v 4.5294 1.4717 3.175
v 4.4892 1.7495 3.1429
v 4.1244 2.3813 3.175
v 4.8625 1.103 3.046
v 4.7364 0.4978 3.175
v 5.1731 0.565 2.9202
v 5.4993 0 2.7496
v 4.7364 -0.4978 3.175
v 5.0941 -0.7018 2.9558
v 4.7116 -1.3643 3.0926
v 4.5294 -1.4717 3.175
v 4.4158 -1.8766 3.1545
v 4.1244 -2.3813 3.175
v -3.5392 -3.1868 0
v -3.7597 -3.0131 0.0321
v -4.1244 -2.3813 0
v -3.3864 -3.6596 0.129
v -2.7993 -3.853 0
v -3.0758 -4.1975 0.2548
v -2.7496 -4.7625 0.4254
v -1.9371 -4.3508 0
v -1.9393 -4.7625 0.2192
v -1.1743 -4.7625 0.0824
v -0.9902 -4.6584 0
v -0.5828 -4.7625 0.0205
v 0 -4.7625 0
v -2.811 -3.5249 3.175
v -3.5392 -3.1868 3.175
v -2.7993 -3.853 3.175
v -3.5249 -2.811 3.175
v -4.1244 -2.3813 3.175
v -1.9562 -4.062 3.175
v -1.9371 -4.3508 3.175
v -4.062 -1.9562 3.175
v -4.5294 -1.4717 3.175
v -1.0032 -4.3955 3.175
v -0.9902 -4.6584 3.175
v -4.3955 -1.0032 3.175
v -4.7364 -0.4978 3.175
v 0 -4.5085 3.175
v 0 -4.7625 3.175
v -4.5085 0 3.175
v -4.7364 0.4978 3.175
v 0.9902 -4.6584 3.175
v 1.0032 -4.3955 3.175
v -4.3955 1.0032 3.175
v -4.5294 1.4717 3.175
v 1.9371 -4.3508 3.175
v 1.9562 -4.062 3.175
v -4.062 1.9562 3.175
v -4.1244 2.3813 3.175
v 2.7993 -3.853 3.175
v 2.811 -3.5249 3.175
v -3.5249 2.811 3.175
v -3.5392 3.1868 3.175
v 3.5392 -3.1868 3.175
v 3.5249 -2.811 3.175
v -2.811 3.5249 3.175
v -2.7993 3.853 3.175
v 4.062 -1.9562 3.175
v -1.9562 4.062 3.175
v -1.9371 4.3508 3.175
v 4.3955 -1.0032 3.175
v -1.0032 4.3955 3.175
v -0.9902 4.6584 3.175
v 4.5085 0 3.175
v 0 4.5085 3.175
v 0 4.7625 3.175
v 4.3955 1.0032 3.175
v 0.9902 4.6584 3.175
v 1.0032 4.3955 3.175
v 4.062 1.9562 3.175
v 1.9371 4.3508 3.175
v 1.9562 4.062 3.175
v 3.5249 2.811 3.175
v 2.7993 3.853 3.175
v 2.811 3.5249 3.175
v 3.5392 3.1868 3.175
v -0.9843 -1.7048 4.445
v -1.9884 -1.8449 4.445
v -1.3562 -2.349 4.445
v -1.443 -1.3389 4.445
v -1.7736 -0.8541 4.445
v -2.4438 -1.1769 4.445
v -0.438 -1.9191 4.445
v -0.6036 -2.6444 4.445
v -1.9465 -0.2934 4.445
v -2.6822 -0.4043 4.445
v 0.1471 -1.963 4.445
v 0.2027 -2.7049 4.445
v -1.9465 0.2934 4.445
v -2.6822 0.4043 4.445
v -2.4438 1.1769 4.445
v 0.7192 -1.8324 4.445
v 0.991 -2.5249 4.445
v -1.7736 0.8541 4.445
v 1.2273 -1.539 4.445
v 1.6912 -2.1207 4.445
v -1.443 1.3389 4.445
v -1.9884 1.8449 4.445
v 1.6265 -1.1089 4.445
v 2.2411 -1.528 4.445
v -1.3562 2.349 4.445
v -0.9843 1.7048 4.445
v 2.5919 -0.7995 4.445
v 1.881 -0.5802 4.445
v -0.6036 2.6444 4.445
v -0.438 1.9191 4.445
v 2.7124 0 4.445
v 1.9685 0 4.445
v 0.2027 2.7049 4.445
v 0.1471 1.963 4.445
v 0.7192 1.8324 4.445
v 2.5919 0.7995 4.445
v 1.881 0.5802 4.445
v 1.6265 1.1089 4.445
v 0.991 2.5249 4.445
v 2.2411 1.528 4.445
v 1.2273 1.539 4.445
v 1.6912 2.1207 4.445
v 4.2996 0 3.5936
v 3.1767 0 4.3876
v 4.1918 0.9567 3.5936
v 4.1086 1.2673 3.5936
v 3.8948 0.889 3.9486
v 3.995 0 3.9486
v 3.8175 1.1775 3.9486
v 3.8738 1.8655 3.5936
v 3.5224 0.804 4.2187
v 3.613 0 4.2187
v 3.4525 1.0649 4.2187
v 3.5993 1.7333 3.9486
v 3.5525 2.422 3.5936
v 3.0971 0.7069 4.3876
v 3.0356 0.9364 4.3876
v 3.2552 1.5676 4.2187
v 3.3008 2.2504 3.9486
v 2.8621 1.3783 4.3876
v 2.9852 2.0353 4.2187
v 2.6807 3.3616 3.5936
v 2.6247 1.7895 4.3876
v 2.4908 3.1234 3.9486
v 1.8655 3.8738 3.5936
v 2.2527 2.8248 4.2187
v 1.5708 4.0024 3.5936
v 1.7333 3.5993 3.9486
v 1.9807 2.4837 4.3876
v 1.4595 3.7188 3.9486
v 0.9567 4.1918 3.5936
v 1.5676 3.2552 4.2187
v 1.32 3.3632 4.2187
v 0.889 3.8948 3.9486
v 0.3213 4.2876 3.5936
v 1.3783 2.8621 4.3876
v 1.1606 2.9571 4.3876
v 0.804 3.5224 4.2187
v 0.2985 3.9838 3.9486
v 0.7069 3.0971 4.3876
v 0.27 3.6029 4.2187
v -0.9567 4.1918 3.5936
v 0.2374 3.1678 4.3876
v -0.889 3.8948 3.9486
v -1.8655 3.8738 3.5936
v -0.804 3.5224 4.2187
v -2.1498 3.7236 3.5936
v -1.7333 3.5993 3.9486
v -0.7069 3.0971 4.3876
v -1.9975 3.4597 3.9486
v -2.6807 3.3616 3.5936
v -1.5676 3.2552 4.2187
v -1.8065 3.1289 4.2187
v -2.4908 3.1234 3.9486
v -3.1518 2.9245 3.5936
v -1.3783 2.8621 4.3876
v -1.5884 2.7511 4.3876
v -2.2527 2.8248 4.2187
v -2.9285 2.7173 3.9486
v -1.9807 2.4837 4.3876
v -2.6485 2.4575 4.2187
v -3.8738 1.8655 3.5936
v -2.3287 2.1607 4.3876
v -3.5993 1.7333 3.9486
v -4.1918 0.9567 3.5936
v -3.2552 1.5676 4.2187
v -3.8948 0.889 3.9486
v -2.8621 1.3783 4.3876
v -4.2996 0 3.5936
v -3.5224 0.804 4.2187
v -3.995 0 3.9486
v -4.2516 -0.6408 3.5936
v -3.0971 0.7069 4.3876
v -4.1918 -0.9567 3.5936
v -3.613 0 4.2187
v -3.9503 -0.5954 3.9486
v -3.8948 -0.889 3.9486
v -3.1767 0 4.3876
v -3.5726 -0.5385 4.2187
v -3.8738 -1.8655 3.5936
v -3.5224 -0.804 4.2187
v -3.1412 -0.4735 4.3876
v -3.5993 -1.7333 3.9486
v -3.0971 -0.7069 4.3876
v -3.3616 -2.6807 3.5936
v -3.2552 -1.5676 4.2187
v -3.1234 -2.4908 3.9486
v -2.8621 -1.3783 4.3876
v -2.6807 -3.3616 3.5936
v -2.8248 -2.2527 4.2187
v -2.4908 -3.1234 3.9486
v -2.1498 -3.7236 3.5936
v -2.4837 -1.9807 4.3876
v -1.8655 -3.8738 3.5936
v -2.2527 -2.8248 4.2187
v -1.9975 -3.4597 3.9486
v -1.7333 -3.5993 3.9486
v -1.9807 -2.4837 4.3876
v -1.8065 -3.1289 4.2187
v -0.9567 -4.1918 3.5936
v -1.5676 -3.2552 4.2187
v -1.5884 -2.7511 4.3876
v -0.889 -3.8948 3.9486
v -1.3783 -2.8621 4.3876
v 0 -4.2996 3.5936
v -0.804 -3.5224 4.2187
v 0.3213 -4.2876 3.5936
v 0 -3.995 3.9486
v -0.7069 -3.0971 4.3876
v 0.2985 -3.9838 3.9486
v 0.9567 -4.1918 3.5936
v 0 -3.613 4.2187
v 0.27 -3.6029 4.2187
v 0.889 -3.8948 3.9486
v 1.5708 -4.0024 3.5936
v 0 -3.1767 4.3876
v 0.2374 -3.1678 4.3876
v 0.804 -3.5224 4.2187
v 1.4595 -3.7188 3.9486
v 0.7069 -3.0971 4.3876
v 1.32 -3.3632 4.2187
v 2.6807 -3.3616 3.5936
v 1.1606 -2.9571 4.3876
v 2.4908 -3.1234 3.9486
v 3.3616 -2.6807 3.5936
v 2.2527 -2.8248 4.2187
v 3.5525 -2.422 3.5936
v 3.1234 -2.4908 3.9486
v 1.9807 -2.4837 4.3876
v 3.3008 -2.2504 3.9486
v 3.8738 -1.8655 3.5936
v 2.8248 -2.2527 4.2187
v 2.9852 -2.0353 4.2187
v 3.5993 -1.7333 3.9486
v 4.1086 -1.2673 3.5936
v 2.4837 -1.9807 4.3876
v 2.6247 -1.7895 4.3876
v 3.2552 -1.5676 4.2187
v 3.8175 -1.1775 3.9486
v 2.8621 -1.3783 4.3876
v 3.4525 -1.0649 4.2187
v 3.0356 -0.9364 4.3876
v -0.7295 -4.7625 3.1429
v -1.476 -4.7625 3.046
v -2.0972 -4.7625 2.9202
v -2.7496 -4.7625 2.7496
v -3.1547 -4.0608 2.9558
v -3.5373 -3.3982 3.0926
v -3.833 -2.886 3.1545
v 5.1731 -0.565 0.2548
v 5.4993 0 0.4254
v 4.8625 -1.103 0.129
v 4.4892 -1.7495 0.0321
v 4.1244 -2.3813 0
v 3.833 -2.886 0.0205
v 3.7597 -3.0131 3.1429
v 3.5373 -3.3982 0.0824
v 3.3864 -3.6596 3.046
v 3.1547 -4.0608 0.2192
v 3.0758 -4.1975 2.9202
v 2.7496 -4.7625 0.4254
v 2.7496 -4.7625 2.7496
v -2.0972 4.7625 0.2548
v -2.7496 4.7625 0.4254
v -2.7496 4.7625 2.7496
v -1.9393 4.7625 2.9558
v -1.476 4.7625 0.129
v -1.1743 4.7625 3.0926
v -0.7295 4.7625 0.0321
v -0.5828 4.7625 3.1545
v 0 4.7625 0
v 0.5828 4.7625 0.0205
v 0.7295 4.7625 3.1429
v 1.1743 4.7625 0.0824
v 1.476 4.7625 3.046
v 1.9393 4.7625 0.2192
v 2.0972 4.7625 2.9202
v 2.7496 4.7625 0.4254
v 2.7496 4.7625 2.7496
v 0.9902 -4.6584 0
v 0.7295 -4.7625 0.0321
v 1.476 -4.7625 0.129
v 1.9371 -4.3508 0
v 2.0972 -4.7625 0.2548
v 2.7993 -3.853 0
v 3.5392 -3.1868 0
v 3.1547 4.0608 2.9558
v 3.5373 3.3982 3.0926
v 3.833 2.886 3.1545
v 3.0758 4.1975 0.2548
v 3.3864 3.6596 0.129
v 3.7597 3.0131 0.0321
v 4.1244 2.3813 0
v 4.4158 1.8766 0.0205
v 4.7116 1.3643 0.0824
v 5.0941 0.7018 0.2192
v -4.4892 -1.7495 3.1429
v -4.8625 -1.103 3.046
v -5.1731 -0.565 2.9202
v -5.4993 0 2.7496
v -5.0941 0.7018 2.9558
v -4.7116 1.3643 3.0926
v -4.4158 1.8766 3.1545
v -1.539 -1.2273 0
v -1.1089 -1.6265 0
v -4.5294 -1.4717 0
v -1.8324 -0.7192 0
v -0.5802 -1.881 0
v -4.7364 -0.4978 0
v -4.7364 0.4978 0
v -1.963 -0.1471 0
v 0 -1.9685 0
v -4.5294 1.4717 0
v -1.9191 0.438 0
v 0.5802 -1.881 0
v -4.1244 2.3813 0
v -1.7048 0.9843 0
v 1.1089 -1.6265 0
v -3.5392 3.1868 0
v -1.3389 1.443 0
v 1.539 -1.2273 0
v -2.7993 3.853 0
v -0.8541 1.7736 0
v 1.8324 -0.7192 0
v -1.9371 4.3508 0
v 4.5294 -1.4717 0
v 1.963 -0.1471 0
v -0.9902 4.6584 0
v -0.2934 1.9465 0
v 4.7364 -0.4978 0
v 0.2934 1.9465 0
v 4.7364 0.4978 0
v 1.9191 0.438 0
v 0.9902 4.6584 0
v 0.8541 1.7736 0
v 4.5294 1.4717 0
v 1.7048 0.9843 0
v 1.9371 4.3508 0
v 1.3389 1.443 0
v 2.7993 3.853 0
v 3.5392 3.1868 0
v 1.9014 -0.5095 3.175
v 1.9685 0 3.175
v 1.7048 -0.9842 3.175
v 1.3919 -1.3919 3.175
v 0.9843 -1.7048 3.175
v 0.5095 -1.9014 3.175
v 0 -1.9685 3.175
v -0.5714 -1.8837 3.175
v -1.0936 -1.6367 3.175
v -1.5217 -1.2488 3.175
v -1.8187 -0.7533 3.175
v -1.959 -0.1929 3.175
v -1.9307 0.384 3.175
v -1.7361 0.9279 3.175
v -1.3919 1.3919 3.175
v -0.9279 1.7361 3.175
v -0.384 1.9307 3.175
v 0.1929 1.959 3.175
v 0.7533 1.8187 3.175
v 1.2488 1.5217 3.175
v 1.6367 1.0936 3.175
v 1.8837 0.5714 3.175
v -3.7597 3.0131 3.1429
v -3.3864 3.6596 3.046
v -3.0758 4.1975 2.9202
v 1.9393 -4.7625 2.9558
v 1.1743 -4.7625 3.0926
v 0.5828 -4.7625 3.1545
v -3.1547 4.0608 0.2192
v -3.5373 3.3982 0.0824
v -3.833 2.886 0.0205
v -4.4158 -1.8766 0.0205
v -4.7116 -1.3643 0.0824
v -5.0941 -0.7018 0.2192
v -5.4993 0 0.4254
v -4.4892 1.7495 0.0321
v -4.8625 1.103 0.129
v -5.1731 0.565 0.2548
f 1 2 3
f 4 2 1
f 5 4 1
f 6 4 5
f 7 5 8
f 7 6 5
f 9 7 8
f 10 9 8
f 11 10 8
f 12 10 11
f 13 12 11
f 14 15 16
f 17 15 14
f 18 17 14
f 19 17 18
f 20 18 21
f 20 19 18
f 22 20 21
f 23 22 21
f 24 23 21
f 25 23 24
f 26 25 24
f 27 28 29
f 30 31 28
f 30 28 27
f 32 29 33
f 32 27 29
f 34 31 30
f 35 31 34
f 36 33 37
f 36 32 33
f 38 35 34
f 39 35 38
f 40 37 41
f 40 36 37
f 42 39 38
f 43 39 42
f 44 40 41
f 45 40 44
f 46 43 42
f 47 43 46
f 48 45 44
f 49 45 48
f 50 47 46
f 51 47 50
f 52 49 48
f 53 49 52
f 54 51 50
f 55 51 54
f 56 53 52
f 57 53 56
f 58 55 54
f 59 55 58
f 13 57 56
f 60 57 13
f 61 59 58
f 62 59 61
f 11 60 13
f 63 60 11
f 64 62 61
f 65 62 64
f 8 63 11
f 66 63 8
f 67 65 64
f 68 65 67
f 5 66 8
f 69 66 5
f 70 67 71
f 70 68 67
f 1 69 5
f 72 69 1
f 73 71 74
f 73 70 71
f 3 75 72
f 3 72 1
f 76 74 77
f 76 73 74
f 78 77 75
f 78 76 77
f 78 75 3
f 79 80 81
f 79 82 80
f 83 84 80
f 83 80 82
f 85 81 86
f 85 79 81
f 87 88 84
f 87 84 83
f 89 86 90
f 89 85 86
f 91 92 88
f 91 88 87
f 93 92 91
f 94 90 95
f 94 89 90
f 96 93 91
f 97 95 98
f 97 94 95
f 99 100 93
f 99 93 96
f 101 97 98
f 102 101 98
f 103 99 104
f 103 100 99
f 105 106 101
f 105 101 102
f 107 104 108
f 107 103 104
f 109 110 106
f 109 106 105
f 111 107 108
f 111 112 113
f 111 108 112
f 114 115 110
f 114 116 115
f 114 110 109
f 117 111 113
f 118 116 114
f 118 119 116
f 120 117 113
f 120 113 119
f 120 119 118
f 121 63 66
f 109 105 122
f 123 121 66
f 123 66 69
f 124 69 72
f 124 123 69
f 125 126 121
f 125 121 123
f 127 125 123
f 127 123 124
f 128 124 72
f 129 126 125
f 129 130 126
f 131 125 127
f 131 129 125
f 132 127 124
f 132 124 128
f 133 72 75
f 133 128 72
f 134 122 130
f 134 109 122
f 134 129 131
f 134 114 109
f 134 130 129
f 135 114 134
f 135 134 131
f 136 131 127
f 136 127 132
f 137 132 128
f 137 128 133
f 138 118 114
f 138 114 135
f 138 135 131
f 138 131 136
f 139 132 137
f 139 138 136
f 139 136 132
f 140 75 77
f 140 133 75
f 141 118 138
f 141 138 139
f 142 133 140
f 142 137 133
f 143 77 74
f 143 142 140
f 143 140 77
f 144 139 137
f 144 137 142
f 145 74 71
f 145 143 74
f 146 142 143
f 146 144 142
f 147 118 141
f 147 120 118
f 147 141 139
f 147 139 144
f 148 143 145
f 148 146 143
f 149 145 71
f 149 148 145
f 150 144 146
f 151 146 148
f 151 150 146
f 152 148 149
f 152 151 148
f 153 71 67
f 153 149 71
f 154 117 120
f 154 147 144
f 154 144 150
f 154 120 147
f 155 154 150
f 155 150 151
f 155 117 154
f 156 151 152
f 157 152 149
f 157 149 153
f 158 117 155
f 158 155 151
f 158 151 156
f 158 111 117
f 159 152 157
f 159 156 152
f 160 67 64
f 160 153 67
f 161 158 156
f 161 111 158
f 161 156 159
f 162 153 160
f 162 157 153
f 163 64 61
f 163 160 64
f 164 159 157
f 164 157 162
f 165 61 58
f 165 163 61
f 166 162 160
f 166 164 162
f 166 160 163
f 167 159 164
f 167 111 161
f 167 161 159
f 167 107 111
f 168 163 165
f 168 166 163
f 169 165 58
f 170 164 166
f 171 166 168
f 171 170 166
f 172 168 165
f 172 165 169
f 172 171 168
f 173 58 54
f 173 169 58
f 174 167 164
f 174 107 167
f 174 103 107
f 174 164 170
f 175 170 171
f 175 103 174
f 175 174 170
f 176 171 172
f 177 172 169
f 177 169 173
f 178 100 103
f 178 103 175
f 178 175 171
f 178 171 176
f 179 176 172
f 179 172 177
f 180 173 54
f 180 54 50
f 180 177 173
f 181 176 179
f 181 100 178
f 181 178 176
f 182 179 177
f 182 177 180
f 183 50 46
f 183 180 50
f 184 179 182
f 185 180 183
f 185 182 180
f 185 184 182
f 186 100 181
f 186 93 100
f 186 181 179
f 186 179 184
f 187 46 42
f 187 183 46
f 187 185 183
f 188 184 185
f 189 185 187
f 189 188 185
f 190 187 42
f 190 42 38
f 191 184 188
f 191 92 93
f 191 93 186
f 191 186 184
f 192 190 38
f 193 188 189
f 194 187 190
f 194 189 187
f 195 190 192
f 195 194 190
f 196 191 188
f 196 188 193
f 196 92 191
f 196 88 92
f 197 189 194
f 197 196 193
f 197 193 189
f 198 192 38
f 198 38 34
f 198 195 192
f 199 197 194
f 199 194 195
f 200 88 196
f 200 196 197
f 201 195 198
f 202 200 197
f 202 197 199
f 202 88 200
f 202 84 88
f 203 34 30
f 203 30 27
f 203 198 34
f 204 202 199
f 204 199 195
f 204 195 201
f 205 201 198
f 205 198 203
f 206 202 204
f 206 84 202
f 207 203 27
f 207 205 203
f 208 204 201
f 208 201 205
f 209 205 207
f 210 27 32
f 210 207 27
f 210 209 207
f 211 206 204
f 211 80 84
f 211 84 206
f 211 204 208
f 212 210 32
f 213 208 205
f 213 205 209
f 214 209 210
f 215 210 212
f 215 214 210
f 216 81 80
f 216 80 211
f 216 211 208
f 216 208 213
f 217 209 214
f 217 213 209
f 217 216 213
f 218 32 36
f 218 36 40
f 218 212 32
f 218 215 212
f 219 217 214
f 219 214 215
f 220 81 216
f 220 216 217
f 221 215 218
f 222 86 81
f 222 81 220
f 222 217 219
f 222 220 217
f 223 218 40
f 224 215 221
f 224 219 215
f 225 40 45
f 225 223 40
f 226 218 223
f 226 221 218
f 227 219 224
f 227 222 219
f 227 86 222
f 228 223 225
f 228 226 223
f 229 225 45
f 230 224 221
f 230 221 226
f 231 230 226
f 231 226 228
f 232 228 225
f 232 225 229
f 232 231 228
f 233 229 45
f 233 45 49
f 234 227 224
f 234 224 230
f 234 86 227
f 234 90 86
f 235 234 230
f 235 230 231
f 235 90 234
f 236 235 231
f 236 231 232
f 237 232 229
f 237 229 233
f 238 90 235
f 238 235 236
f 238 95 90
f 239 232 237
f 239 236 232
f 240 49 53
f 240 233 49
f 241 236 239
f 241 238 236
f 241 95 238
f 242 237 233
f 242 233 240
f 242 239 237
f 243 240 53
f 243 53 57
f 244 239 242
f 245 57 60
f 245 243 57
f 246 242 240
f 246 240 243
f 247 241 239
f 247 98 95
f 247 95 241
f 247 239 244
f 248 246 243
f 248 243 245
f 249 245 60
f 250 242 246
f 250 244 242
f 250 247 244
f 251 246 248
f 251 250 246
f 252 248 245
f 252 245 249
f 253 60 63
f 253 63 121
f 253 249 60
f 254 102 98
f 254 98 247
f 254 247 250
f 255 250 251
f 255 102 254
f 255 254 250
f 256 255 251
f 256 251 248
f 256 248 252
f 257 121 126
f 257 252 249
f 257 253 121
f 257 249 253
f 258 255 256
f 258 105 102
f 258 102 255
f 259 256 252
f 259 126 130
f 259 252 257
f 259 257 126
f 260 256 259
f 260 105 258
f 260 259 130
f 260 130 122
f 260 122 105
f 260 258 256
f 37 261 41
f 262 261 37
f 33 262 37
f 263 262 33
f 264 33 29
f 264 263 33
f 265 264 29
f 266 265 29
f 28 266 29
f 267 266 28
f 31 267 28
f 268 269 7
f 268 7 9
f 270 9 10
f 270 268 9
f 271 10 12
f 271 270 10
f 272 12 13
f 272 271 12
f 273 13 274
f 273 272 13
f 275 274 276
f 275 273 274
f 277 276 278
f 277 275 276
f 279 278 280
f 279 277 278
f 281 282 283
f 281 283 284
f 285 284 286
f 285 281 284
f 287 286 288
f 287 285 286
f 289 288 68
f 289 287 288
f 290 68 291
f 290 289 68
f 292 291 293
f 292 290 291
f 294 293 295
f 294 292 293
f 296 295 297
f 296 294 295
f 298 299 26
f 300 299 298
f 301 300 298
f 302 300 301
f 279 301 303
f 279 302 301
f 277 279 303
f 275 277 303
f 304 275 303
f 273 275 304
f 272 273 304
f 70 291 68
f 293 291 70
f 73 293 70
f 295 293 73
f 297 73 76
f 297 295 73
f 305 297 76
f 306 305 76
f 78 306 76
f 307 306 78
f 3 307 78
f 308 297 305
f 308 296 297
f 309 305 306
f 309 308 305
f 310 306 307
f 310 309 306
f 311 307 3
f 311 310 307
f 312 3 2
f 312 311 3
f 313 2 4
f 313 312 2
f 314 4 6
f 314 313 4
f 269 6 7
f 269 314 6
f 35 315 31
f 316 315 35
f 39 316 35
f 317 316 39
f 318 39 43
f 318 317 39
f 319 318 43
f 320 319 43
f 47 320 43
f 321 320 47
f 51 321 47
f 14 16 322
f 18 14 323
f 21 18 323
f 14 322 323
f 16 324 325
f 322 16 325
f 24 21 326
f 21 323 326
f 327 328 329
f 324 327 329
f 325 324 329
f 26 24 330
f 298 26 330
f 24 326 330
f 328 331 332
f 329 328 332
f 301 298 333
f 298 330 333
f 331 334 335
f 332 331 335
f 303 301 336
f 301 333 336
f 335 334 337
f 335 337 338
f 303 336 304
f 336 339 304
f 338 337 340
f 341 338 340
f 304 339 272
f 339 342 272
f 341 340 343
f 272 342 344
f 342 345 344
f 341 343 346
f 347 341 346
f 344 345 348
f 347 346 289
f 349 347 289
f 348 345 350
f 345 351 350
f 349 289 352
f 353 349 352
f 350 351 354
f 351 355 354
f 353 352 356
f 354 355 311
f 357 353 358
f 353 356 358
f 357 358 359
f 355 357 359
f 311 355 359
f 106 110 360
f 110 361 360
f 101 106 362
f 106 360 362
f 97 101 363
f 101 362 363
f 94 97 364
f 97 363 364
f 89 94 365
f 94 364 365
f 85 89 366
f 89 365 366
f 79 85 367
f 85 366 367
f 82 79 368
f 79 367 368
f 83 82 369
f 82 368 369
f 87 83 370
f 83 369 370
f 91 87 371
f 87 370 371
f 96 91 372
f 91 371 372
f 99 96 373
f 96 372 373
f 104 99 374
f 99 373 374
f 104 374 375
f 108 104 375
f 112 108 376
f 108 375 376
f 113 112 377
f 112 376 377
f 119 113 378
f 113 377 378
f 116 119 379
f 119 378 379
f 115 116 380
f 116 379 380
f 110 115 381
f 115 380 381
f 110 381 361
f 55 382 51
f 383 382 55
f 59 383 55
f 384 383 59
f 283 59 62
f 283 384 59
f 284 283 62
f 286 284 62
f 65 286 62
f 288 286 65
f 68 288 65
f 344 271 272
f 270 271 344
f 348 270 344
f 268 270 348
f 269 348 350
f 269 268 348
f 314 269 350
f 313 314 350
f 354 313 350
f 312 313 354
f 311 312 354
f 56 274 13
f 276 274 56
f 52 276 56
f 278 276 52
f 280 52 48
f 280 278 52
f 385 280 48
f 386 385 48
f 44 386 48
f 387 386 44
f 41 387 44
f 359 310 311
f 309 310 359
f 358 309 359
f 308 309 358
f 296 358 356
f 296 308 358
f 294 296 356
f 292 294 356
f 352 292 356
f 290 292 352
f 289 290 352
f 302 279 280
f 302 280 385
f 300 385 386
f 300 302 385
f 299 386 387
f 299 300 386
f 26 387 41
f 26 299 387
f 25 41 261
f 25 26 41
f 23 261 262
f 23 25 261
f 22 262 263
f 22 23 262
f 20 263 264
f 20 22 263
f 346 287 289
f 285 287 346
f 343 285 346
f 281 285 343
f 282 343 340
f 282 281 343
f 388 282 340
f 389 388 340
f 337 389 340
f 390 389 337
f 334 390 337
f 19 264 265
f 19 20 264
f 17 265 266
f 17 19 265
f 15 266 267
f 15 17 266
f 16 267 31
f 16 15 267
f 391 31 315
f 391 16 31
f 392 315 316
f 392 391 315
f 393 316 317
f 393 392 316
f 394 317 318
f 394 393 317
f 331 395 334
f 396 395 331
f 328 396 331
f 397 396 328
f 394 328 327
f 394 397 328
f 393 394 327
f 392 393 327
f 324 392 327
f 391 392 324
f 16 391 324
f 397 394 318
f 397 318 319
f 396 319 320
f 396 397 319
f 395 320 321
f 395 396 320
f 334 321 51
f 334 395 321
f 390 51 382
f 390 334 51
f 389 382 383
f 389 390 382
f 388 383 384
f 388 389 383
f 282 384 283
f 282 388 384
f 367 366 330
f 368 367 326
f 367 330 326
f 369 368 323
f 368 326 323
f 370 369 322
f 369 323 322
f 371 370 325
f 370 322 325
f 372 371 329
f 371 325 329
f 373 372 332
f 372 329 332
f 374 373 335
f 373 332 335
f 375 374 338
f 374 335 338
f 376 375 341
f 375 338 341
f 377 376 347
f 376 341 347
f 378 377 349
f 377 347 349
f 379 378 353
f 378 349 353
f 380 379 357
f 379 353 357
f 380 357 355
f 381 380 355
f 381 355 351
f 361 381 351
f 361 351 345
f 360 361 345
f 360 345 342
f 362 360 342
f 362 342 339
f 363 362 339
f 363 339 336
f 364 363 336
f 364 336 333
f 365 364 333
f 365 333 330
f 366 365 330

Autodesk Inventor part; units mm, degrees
ref_plane "YZ Plane" through (0, 0, 0) normal (1, 0, 0) x (0, 1, 0)
ref_plane "XZ Plane" through (0, 0, 0) normal (0, 1, 0) x (-1, 0, 0)
ref_plane "XY Plane" through (0, 0, 0) normal (0, 0, 1) x (1, 0, 0)
sketch "Sketch1" plane through (0, 0, 0) normal (0, 0, 1) x (1, 0, 0)
  circle A0 centre (0, 0) radius 4.7625 construction
  line L0 (2.7496, 4.7625) -> (5.4993, 0)
  line L1 (5.4993, 0) -> (2.7496, -4.7625)
  line L2 (2.7496, -4.7625) -> (-2.7496, -4.7625)
  line L3 (-2.7496, -4.7625) -> (-5.4993, 0)
  line L4 (-5.4993, 0) -> (-2.7496, 4.7625)
  line L5 (-2.7496, 4.7625) -> (2.7496, 4.7625)
  point P0 (0, 4.7625)
  dimension "d0" = 9.525
extrude "Extrusion1" add sketch "Sketch1" along normal blind 3.175
sketch "Sketch2" plane through (0, 0, 3.175) normal (0, 0, 1) x (1, 0, 0)
  point P0 (0, 0)
hole "Hole1" at (0, 0, 3.175) direction (0, 0, -1) diameter 3.937 end through all thread size "10-24 UNC" class "2B" standard "ANSI Unified Screw Threads"
sketch "Sketch3" plane through (0, 0, 0) normal (1, 0, 0) x (0, 1, 0)
  line L0 (-4.7625, 3.175) -> (0, 3.175) projected
  line L1 (-4.7625, 0) -> (0, 0) projected
  line L2 (-4.7625, 3.175) -> (-6.7124, 3.175)
  line L3 (-6.7124, 3.175) -> (-6.7124, 2.0492)
  line L4 (-6.7124, 2.0492) -> (-4.7625, 3.175)
  line L5 (-4.7625, 0) -> (-6.7124, 0)
  line L6 (-6.7124, 0) -> (-6.7124, 1.1258)
  line L7 (-6.7124, 1.1258) -> (-4.7625, 0)
  line L8 (0, -0.3175) -> (0, 4.1275) projected
  dimension "d10" = 30
  dimension "d11" = 30
revolve "Revolution1" cut sketch "Sketch3" angle 360 about axis through (0, 0, -10) along (0, 0, 1)
sketch "Sketch4" plane through (0, 0, 3.175) normal (0, 0, 1) x (1, 0, 0)
  arc A0 (4.1244, -2.3813) -> (4.1244, 2.3813) centre (0, 0) ccw projected
  arc A1 (4.1244, 2.3813) -> (0, 4.7625) centre (0, 0) ccw projected
  arc A2 (0, 4.7625) -> (-4.1244, 2.3812) centre (0, 0) ccw projected
  arc A3 (-4.1244, 2.3812) -> (-4.1244, -2.3813) centre (0, 0) ccw projected
  arc A4 (-4.1244, -2.3813) -> (0, -4.7625) centre (0, 0) ccw projected
  arc A5 (0, -4.7625) -> (4.1244, -2.3813) centre (0, 0) ccw projected
  circle A6 centre (0, 0) radius 1.9685 projected
  circle A7 centre (0, 0) radius 4.5085
  dimension "d16" = 0.254
extrude "Extrusion2" add sketch "Sketch4" along normal blind 1.27 contours A7
fillet "Fillet1" radius 1.905 1 edges at (-4.5085, 0, 4.445)
equation "\"d10\" = d11"
properties part number "PWTR-0034"
